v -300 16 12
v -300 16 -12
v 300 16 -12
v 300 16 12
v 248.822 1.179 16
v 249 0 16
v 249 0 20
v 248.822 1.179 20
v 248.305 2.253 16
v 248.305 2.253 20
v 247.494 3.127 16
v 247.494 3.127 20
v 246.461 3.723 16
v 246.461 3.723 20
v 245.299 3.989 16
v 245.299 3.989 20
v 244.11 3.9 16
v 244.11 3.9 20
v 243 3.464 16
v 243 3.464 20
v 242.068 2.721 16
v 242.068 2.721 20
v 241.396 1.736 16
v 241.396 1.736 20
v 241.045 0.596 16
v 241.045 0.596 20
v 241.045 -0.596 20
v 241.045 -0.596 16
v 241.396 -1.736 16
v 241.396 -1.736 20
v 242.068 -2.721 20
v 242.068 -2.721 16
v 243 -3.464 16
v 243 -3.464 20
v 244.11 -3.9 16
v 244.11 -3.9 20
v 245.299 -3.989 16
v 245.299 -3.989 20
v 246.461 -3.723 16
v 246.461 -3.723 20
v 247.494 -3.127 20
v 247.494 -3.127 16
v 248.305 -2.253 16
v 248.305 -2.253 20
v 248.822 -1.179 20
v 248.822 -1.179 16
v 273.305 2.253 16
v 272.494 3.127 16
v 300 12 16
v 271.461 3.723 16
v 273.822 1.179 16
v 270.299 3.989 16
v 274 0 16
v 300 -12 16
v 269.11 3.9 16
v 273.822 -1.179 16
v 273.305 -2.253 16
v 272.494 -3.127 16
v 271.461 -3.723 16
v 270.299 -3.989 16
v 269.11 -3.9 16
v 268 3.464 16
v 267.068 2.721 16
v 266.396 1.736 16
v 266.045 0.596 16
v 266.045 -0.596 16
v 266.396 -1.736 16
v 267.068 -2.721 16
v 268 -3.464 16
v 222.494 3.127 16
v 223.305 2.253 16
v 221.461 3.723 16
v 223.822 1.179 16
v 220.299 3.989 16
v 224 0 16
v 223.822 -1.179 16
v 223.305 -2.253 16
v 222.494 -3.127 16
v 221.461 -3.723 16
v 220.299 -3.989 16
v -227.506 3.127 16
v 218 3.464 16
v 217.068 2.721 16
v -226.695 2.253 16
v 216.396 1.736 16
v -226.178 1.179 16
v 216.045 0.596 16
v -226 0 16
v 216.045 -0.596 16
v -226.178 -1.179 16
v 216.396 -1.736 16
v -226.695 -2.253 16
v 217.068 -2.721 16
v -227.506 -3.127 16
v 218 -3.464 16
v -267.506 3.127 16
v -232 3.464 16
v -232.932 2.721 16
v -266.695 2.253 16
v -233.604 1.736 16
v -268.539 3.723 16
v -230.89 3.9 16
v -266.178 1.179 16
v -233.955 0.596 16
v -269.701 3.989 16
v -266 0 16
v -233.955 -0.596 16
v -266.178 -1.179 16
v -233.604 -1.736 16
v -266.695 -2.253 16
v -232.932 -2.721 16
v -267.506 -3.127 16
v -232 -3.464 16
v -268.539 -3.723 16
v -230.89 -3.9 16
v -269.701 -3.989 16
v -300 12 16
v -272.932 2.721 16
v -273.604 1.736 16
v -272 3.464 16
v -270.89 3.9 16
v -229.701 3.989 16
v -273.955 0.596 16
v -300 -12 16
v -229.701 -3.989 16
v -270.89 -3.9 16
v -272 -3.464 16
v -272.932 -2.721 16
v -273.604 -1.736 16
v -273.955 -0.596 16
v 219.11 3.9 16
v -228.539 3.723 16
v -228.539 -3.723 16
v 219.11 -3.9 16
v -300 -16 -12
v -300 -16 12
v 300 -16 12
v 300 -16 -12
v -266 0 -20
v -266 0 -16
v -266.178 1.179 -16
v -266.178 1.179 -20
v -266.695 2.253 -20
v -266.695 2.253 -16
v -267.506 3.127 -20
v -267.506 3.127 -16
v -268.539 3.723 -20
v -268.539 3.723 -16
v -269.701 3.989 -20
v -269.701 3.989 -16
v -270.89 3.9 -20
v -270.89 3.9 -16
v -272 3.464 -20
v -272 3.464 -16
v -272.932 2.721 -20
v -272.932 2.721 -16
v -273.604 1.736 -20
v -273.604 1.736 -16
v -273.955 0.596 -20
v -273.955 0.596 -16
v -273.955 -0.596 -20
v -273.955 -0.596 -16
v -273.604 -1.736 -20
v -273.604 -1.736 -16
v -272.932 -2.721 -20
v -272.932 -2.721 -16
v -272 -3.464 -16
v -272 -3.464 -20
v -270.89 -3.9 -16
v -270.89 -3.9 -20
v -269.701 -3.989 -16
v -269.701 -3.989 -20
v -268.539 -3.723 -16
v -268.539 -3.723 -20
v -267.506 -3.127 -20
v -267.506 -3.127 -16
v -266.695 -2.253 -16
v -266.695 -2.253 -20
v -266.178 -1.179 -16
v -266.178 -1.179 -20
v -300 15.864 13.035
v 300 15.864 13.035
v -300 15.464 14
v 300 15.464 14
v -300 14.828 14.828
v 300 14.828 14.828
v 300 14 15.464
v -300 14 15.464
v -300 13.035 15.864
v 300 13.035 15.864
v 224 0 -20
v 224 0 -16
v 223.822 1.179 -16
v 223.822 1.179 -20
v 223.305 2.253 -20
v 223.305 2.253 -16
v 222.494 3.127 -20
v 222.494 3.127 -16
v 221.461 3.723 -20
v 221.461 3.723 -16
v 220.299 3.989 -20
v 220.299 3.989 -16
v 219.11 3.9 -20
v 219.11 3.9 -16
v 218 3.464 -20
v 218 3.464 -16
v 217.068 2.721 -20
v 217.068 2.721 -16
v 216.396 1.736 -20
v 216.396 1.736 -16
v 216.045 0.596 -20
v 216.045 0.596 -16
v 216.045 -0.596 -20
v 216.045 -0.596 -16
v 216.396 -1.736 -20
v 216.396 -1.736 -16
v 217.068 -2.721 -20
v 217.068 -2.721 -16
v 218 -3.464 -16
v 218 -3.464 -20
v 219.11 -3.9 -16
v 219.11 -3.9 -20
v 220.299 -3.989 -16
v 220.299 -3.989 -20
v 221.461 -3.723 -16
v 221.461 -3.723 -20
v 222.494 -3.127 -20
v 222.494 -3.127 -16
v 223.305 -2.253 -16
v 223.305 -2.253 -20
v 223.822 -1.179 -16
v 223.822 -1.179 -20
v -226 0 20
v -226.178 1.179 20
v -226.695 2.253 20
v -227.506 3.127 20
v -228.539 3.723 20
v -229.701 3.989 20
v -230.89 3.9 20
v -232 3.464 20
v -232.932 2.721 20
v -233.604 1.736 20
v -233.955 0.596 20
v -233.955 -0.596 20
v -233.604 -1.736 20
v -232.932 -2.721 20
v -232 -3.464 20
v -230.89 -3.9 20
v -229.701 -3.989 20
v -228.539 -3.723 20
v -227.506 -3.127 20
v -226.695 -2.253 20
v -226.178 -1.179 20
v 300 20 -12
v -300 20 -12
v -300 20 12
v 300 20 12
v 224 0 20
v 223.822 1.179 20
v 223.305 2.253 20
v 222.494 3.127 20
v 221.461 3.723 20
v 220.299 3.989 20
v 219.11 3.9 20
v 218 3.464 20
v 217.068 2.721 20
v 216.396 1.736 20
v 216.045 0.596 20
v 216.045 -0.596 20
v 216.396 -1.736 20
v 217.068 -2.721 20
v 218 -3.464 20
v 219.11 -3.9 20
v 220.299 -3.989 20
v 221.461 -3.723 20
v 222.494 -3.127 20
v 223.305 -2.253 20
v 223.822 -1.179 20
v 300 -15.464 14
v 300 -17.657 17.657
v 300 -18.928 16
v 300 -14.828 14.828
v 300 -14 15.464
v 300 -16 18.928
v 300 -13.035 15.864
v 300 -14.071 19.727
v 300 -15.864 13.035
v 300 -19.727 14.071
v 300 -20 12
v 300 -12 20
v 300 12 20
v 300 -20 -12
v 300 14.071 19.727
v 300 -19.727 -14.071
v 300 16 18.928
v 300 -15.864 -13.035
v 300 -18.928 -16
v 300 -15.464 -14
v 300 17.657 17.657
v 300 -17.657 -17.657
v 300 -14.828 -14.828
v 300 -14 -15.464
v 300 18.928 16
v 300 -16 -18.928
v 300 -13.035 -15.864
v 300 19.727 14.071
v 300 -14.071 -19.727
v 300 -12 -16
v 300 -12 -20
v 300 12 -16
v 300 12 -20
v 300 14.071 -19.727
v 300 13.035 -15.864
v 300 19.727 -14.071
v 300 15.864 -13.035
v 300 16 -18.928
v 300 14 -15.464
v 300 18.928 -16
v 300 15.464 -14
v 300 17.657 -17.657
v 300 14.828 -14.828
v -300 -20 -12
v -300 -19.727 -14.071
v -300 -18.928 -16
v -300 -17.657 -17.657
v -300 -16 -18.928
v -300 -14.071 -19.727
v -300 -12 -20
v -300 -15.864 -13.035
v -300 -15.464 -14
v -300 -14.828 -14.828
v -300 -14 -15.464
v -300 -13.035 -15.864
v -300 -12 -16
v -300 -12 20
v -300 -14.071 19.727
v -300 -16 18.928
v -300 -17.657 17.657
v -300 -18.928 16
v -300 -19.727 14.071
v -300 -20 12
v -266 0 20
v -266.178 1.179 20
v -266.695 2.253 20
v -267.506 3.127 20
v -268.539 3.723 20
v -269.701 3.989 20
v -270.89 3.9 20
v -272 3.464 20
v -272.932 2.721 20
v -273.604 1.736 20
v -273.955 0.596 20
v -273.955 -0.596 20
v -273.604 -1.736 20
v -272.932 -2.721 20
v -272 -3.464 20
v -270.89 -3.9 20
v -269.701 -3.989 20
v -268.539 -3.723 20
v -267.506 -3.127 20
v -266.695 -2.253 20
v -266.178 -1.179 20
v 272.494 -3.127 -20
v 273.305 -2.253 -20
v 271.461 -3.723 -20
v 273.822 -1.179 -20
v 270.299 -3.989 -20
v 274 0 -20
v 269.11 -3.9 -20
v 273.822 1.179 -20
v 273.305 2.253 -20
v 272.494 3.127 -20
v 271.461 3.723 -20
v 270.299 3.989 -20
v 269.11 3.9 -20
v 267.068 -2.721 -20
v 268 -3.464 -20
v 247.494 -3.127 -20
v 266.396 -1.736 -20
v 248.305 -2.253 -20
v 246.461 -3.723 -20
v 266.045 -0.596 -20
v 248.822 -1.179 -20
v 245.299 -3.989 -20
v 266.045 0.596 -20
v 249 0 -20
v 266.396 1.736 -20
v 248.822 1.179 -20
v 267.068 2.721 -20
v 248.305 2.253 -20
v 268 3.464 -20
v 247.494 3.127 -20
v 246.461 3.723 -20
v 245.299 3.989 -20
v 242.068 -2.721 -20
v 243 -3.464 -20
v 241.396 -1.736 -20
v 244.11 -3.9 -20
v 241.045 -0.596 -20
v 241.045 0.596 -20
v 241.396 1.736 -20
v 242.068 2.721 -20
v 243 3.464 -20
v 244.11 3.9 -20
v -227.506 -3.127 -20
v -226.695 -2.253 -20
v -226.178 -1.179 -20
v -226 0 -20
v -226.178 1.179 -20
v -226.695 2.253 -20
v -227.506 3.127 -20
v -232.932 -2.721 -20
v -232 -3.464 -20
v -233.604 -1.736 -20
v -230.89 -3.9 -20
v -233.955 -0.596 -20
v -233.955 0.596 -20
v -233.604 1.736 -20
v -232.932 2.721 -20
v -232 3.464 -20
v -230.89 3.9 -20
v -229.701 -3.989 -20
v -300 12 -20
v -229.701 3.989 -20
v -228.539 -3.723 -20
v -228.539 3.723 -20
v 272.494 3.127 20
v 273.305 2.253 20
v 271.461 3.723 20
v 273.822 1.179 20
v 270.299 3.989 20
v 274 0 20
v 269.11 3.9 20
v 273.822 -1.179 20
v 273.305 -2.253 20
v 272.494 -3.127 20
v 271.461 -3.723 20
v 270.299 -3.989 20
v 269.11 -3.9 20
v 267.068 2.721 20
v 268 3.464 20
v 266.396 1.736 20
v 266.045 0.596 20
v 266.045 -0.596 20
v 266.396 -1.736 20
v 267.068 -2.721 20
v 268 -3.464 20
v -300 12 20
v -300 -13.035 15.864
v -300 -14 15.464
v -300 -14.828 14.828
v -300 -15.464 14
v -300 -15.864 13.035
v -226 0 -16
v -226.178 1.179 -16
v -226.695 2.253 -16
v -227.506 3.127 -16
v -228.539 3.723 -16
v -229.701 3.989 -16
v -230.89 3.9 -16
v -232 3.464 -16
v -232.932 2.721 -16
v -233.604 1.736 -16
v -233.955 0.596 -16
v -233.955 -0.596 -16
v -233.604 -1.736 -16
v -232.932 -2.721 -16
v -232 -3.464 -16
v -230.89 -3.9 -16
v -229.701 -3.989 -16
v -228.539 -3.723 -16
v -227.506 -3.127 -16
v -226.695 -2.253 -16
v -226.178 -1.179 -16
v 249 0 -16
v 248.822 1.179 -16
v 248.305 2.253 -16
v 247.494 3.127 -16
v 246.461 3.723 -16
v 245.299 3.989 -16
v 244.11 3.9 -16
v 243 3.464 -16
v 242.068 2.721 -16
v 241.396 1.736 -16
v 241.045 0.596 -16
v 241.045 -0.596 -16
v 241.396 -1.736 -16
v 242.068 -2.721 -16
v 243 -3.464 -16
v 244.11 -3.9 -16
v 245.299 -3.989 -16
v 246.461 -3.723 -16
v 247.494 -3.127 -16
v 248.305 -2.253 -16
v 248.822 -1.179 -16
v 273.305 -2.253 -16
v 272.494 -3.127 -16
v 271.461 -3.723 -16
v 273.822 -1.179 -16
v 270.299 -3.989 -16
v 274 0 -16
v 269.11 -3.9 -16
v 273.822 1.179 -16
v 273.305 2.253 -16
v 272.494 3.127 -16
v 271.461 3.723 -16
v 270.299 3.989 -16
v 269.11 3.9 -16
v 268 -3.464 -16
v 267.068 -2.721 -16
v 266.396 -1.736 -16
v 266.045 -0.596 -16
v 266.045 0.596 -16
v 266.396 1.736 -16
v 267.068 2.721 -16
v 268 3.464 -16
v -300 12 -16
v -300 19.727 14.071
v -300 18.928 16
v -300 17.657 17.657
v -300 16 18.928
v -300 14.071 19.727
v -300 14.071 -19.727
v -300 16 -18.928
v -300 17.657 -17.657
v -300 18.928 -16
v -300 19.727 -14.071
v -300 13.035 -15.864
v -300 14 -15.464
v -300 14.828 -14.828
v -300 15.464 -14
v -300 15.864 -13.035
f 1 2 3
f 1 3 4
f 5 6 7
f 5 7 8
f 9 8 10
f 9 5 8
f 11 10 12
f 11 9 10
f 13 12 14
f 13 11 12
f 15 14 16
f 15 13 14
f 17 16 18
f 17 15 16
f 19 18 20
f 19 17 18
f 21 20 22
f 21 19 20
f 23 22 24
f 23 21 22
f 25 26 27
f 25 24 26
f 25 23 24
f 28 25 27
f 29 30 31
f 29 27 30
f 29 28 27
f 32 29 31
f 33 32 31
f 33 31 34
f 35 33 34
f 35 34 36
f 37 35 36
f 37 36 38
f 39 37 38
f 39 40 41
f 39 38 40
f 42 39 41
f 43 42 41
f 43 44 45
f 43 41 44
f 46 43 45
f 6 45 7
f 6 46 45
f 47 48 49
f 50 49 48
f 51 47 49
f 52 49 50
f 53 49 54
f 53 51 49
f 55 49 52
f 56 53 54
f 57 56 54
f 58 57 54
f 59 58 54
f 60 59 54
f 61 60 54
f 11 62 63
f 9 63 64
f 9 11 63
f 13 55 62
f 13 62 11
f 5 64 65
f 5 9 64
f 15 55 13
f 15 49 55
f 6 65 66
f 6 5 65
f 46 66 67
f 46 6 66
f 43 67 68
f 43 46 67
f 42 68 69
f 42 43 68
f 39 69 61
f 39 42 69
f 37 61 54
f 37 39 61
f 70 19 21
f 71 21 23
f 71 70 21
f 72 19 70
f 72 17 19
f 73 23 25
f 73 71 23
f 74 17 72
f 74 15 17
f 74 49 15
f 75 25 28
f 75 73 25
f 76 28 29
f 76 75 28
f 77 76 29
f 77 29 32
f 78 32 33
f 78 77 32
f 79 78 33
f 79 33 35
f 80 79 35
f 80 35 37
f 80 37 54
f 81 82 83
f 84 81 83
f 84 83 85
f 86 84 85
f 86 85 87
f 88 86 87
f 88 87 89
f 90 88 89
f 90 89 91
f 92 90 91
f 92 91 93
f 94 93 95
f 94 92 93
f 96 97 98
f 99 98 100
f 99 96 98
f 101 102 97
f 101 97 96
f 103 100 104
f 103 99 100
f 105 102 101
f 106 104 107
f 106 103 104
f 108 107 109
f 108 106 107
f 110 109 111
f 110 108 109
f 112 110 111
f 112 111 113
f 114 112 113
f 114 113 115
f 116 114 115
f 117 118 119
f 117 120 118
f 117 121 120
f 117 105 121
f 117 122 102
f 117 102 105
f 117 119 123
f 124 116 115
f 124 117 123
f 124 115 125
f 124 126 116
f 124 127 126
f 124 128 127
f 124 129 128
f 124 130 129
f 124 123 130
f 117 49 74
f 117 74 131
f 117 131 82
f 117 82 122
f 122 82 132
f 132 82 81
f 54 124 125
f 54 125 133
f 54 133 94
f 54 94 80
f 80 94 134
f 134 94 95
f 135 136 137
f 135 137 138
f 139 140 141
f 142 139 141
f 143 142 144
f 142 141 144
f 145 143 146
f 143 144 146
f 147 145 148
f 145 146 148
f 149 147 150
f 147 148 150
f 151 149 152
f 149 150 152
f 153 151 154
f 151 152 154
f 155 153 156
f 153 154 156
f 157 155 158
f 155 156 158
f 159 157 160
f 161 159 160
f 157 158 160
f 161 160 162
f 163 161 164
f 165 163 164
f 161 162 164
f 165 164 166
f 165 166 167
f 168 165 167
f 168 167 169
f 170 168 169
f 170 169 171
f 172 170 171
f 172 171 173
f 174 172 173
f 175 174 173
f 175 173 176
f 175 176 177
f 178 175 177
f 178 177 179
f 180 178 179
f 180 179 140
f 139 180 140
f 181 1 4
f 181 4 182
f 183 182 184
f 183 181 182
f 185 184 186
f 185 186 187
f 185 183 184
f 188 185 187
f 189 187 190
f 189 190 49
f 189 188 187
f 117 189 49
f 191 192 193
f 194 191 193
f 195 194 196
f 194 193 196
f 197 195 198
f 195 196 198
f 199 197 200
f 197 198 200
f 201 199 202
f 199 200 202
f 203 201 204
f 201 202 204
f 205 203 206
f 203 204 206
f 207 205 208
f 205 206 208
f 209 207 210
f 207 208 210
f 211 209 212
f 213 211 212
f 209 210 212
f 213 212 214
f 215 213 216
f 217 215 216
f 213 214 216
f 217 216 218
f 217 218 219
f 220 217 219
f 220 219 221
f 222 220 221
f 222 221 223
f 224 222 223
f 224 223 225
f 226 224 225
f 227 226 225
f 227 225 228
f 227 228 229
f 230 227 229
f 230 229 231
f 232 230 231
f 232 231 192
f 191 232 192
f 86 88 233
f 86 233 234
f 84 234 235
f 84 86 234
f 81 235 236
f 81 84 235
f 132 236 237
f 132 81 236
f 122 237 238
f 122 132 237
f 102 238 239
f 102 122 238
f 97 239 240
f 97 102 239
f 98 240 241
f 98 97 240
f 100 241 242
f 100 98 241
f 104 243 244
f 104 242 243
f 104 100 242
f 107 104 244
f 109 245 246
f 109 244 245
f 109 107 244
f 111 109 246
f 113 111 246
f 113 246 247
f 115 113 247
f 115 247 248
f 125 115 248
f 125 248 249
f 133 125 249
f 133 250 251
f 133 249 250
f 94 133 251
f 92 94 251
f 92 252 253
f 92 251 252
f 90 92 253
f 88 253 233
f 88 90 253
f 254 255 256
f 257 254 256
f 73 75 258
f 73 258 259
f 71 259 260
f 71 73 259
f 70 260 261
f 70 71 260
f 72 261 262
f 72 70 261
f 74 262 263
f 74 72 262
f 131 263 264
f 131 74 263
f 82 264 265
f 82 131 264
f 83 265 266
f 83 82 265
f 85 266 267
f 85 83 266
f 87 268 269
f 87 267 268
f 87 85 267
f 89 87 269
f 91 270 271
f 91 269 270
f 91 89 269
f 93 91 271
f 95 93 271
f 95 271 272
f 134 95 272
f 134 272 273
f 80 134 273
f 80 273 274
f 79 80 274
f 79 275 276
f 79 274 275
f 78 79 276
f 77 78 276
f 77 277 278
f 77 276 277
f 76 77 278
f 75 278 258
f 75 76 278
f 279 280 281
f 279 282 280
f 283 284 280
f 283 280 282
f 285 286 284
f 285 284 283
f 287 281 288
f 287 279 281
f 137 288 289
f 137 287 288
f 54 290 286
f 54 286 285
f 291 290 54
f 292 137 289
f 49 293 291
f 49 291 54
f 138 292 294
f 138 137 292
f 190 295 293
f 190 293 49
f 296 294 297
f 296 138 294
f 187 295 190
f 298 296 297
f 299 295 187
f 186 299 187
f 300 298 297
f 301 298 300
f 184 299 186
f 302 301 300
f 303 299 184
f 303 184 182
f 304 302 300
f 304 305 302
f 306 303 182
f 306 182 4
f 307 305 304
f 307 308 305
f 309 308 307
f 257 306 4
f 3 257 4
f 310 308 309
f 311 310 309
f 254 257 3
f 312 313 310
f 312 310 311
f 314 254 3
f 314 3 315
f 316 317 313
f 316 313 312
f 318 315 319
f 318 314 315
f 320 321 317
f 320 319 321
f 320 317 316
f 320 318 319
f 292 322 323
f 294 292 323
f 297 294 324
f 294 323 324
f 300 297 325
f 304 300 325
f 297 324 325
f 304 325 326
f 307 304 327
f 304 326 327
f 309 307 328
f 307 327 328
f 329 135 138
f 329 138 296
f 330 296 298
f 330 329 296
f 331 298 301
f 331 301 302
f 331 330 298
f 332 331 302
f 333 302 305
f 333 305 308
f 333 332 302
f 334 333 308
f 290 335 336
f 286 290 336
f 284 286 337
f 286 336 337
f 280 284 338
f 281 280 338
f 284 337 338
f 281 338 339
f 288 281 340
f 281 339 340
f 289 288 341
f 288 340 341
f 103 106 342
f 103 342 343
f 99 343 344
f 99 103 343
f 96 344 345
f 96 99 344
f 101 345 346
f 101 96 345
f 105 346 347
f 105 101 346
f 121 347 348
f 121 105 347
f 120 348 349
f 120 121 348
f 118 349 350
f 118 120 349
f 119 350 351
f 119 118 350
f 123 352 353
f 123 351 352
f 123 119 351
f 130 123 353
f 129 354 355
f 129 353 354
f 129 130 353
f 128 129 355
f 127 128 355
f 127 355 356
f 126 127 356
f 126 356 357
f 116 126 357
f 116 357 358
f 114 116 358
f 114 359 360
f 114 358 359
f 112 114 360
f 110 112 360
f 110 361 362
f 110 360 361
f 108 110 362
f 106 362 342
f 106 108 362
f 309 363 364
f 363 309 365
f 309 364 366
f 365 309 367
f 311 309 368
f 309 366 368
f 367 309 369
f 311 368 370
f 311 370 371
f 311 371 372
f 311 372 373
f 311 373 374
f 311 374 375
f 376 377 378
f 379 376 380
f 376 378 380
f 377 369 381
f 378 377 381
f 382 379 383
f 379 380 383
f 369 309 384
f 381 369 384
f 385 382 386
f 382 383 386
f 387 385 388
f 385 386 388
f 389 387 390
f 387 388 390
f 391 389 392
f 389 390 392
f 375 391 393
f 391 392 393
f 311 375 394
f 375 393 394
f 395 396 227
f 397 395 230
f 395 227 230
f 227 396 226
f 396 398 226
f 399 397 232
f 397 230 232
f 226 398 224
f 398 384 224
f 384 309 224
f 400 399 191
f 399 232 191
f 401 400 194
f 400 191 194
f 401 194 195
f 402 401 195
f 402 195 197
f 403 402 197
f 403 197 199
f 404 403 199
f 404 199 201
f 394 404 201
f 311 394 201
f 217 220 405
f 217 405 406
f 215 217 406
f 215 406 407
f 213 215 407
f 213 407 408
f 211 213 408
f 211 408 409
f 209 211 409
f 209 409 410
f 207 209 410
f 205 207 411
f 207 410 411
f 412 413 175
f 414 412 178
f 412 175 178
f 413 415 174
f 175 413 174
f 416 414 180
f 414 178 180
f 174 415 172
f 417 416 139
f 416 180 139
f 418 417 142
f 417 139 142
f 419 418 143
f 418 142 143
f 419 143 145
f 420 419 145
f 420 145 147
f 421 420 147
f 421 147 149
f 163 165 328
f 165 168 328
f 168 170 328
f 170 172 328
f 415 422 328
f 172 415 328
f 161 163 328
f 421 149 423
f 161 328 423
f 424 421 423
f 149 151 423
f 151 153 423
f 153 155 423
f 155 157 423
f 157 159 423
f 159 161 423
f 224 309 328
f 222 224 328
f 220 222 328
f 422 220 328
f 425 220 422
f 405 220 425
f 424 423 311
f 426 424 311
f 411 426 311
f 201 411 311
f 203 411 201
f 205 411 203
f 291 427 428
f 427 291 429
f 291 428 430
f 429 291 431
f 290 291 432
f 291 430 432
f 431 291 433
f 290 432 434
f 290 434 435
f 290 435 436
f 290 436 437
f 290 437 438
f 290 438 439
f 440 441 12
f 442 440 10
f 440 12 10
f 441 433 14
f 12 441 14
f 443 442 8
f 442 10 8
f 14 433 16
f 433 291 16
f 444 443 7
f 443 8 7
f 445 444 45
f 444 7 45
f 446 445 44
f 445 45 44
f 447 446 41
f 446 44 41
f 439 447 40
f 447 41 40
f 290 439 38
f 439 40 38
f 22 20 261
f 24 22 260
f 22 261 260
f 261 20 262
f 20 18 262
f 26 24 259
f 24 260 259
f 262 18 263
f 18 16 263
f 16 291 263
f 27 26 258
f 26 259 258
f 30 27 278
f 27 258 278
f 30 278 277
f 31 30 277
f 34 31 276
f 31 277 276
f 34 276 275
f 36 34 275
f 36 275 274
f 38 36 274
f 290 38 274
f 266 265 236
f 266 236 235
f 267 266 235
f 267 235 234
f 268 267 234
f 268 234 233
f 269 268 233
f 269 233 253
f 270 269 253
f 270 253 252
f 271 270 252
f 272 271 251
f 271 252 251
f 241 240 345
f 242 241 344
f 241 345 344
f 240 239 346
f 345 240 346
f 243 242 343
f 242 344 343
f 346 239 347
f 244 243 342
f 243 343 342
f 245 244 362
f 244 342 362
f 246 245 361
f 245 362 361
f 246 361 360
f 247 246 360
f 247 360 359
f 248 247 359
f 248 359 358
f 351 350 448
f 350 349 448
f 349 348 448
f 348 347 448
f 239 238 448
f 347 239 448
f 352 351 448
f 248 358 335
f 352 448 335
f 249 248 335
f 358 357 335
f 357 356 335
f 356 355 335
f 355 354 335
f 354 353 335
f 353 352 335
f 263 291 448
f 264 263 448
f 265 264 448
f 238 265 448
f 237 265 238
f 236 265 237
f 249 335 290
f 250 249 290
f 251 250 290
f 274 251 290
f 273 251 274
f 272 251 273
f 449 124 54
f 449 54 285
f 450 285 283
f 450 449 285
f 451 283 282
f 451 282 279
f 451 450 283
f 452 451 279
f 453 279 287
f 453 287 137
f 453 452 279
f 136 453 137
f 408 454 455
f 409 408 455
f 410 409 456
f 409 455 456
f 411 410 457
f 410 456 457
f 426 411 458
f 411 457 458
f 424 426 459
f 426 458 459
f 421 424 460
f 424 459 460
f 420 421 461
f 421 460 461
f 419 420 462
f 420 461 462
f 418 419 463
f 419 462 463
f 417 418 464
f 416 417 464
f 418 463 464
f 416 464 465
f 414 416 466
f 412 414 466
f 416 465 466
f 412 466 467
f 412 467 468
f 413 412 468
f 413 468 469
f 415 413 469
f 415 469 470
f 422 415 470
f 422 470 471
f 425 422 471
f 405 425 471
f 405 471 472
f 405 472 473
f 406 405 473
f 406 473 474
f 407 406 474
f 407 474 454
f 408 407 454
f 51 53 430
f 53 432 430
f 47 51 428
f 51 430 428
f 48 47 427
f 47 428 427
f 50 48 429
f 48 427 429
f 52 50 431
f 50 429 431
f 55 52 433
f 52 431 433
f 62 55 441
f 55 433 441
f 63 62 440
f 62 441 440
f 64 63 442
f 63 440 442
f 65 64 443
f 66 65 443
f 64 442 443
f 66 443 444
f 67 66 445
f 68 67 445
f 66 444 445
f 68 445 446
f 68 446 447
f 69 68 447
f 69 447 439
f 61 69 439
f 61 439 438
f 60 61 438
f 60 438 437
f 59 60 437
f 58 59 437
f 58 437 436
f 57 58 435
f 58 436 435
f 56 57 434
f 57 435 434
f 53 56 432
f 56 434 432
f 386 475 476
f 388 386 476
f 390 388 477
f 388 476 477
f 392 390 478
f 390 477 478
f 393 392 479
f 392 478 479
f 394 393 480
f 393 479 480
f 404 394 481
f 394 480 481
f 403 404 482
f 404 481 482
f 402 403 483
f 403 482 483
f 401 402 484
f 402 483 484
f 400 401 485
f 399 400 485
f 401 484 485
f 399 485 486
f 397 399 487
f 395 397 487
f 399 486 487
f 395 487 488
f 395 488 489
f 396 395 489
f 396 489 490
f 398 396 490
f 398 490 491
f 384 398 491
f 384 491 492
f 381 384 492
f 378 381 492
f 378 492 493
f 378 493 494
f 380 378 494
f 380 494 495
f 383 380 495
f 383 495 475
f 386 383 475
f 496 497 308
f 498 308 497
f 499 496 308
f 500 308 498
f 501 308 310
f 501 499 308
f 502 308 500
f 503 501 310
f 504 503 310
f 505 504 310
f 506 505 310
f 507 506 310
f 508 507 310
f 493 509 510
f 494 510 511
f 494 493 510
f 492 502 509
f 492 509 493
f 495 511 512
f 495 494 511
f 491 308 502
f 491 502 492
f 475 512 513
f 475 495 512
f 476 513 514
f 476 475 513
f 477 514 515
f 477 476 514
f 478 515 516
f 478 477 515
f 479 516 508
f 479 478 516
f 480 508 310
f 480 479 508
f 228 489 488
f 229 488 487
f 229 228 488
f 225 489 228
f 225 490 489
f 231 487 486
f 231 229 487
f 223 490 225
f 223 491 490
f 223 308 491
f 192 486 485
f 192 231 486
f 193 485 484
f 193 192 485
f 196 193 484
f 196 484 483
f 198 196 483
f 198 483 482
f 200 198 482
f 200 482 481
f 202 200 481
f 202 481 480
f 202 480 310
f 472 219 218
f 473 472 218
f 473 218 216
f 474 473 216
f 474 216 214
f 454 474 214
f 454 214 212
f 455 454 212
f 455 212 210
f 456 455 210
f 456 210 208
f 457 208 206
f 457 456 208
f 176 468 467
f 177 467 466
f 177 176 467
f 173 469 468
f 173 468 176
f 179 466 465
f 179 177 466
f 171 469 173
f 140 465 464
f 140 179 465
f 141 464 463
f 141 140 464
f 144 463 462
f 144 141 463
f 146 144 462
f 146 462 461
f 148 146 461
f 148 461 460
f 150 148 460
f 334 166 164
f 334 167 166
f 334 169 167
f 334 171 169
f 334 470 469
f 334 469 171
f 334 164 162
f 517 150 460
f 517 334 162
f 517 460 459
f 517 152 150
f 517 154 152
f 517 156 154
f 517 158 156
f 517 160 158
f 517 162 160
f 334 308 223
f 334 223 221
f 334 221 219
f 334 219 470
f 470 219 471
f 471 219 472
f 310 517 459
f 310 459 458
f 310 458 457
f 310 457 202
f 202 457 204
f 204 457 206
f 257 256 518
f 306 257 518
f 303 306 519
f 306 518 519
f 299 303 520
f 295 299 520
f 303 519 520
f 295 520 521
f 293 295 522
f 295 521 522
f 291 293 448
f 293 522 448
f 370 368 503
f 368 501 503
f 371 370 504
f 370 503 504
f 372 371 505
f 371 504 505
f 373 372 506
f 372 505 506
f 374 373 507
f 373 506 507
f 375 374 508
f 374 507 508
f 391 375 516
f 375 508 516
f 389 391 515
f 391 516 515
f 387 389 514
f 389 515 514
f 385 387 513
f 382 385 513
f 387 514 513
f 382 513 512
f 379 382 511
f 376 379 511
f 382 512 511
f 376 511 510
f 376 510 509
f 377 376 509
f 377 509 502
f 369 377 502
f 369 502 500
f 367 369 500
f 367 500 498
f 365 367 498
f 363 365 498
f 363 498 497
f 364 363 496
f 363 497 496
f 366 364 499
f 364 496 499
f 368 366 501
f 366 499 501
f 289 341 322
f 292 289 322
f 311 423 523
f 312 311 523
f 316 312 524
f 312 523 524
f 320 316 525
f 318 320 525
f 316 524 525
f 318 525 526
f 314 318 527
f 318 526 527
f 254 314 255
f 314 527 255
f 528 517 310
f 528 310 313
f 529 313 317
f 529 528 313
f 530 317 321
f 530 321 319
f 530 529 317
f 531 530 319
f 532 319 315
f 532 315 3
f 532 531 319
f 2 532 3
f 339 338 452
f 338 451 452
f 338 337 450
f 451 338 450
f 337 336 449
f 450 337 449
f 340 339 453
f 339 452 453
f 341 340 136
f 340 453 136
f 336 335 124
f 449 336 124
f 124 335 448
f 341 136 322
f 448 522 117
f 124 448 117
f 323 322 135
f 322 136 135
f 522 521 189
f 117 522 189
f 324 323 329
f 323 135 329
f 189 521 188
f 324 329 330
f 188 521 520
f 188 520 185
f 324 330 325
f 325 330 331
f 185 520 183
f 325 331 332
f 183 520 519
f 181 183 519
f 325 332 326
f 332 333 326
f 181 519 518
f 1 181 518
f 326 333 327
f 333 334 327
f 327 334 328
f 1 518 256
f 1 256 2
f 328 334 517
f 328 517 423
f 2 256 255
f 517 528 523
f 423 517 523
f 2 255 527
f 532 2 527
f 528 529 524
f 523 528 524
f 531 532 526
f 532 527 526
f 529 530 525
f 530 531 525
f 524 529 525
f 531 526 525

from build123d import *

# Parameters (mm, degrees)
TUBO_CUADRADO_40_X_40_X_4_1_DEPTH = 600
CROQUIS3_R                        = 4
CORTAR_EXTRUIR1_DEPTH             = 25


with BuildPart() as part:
    # Sketch1 → Tubo cuadrado 40 X 40 X 4(1) (new body)
    with BuildSketch(Plane(origin=(-300, 0, 0), x_dir=(0, 0, -1), z_dir=(1, 0, 0))):
        with BuildLine():
            Line((-12, -20), (12, -20))
            ThreePointArc((12, -20), (17.656854249, -17.656854249), (20, -12))
            Line((20, -12), (20, 12))
            ThreePointArc((20, 12), (17.656854249, 17.656854249), (12, 20))
            Line((12, 20), (-12, 20))
            ThreePointArc((-12, 20), (-17.656854249, 17.656854249), (-20, 12))
            Line((-20, 12), (-20, -12))
            ThreePointArc((-20, -12), (-17.656854249, -17.656854249), (-12, -20))
        make_face()
        with BuildLine():
            Line((-12, -16), (12, -16))
            ThreePointArc((12, -16), (14.828427125, -14.828427125), (16, -12))
            Line((16, -12), (16, 12))
            ThreePointArc((16, 12), (14.828427125, 14.828427125), (12, 16))
            Line((12, 16), (-12, 16))
            ThreePointArc((-12, 16), (-14.828427125, 14.828427125), (-16, 12))
            Line((-16, 12), (-16, -12))
            ThreePointArc((-16, -12), (-14.828427125, -14.828427125), (-12, -16))
        make_face(mode=Mode.SUBTRACT)
    extrude(amount=TUBO_CUADRADO_40_X_40_X_4_1_DEPTH)

    # Croquis3 → Cortar-Extruir1 (cut, symmetric)
    with BuildSketch(Plane.XY):
        with Locations((-270, 0)):
            Circle(CROQUIS3_R)
        with Locations((-230, 0)):
            Circle(CROQUIS3_R)
        with Locations((220, 0)):
            Circle(CROQUIS3_R)
        with Locations((245, 0)):
            Circle(CROQUIS3_R)
        with Locations((270, 0)):
            Circle(CROQUIS3_R)
    extrude(amount=CORTAR_EXTRUIR1_DEPTH, both=True, mode=Mode.SUBTRACT)


solid = part.part
